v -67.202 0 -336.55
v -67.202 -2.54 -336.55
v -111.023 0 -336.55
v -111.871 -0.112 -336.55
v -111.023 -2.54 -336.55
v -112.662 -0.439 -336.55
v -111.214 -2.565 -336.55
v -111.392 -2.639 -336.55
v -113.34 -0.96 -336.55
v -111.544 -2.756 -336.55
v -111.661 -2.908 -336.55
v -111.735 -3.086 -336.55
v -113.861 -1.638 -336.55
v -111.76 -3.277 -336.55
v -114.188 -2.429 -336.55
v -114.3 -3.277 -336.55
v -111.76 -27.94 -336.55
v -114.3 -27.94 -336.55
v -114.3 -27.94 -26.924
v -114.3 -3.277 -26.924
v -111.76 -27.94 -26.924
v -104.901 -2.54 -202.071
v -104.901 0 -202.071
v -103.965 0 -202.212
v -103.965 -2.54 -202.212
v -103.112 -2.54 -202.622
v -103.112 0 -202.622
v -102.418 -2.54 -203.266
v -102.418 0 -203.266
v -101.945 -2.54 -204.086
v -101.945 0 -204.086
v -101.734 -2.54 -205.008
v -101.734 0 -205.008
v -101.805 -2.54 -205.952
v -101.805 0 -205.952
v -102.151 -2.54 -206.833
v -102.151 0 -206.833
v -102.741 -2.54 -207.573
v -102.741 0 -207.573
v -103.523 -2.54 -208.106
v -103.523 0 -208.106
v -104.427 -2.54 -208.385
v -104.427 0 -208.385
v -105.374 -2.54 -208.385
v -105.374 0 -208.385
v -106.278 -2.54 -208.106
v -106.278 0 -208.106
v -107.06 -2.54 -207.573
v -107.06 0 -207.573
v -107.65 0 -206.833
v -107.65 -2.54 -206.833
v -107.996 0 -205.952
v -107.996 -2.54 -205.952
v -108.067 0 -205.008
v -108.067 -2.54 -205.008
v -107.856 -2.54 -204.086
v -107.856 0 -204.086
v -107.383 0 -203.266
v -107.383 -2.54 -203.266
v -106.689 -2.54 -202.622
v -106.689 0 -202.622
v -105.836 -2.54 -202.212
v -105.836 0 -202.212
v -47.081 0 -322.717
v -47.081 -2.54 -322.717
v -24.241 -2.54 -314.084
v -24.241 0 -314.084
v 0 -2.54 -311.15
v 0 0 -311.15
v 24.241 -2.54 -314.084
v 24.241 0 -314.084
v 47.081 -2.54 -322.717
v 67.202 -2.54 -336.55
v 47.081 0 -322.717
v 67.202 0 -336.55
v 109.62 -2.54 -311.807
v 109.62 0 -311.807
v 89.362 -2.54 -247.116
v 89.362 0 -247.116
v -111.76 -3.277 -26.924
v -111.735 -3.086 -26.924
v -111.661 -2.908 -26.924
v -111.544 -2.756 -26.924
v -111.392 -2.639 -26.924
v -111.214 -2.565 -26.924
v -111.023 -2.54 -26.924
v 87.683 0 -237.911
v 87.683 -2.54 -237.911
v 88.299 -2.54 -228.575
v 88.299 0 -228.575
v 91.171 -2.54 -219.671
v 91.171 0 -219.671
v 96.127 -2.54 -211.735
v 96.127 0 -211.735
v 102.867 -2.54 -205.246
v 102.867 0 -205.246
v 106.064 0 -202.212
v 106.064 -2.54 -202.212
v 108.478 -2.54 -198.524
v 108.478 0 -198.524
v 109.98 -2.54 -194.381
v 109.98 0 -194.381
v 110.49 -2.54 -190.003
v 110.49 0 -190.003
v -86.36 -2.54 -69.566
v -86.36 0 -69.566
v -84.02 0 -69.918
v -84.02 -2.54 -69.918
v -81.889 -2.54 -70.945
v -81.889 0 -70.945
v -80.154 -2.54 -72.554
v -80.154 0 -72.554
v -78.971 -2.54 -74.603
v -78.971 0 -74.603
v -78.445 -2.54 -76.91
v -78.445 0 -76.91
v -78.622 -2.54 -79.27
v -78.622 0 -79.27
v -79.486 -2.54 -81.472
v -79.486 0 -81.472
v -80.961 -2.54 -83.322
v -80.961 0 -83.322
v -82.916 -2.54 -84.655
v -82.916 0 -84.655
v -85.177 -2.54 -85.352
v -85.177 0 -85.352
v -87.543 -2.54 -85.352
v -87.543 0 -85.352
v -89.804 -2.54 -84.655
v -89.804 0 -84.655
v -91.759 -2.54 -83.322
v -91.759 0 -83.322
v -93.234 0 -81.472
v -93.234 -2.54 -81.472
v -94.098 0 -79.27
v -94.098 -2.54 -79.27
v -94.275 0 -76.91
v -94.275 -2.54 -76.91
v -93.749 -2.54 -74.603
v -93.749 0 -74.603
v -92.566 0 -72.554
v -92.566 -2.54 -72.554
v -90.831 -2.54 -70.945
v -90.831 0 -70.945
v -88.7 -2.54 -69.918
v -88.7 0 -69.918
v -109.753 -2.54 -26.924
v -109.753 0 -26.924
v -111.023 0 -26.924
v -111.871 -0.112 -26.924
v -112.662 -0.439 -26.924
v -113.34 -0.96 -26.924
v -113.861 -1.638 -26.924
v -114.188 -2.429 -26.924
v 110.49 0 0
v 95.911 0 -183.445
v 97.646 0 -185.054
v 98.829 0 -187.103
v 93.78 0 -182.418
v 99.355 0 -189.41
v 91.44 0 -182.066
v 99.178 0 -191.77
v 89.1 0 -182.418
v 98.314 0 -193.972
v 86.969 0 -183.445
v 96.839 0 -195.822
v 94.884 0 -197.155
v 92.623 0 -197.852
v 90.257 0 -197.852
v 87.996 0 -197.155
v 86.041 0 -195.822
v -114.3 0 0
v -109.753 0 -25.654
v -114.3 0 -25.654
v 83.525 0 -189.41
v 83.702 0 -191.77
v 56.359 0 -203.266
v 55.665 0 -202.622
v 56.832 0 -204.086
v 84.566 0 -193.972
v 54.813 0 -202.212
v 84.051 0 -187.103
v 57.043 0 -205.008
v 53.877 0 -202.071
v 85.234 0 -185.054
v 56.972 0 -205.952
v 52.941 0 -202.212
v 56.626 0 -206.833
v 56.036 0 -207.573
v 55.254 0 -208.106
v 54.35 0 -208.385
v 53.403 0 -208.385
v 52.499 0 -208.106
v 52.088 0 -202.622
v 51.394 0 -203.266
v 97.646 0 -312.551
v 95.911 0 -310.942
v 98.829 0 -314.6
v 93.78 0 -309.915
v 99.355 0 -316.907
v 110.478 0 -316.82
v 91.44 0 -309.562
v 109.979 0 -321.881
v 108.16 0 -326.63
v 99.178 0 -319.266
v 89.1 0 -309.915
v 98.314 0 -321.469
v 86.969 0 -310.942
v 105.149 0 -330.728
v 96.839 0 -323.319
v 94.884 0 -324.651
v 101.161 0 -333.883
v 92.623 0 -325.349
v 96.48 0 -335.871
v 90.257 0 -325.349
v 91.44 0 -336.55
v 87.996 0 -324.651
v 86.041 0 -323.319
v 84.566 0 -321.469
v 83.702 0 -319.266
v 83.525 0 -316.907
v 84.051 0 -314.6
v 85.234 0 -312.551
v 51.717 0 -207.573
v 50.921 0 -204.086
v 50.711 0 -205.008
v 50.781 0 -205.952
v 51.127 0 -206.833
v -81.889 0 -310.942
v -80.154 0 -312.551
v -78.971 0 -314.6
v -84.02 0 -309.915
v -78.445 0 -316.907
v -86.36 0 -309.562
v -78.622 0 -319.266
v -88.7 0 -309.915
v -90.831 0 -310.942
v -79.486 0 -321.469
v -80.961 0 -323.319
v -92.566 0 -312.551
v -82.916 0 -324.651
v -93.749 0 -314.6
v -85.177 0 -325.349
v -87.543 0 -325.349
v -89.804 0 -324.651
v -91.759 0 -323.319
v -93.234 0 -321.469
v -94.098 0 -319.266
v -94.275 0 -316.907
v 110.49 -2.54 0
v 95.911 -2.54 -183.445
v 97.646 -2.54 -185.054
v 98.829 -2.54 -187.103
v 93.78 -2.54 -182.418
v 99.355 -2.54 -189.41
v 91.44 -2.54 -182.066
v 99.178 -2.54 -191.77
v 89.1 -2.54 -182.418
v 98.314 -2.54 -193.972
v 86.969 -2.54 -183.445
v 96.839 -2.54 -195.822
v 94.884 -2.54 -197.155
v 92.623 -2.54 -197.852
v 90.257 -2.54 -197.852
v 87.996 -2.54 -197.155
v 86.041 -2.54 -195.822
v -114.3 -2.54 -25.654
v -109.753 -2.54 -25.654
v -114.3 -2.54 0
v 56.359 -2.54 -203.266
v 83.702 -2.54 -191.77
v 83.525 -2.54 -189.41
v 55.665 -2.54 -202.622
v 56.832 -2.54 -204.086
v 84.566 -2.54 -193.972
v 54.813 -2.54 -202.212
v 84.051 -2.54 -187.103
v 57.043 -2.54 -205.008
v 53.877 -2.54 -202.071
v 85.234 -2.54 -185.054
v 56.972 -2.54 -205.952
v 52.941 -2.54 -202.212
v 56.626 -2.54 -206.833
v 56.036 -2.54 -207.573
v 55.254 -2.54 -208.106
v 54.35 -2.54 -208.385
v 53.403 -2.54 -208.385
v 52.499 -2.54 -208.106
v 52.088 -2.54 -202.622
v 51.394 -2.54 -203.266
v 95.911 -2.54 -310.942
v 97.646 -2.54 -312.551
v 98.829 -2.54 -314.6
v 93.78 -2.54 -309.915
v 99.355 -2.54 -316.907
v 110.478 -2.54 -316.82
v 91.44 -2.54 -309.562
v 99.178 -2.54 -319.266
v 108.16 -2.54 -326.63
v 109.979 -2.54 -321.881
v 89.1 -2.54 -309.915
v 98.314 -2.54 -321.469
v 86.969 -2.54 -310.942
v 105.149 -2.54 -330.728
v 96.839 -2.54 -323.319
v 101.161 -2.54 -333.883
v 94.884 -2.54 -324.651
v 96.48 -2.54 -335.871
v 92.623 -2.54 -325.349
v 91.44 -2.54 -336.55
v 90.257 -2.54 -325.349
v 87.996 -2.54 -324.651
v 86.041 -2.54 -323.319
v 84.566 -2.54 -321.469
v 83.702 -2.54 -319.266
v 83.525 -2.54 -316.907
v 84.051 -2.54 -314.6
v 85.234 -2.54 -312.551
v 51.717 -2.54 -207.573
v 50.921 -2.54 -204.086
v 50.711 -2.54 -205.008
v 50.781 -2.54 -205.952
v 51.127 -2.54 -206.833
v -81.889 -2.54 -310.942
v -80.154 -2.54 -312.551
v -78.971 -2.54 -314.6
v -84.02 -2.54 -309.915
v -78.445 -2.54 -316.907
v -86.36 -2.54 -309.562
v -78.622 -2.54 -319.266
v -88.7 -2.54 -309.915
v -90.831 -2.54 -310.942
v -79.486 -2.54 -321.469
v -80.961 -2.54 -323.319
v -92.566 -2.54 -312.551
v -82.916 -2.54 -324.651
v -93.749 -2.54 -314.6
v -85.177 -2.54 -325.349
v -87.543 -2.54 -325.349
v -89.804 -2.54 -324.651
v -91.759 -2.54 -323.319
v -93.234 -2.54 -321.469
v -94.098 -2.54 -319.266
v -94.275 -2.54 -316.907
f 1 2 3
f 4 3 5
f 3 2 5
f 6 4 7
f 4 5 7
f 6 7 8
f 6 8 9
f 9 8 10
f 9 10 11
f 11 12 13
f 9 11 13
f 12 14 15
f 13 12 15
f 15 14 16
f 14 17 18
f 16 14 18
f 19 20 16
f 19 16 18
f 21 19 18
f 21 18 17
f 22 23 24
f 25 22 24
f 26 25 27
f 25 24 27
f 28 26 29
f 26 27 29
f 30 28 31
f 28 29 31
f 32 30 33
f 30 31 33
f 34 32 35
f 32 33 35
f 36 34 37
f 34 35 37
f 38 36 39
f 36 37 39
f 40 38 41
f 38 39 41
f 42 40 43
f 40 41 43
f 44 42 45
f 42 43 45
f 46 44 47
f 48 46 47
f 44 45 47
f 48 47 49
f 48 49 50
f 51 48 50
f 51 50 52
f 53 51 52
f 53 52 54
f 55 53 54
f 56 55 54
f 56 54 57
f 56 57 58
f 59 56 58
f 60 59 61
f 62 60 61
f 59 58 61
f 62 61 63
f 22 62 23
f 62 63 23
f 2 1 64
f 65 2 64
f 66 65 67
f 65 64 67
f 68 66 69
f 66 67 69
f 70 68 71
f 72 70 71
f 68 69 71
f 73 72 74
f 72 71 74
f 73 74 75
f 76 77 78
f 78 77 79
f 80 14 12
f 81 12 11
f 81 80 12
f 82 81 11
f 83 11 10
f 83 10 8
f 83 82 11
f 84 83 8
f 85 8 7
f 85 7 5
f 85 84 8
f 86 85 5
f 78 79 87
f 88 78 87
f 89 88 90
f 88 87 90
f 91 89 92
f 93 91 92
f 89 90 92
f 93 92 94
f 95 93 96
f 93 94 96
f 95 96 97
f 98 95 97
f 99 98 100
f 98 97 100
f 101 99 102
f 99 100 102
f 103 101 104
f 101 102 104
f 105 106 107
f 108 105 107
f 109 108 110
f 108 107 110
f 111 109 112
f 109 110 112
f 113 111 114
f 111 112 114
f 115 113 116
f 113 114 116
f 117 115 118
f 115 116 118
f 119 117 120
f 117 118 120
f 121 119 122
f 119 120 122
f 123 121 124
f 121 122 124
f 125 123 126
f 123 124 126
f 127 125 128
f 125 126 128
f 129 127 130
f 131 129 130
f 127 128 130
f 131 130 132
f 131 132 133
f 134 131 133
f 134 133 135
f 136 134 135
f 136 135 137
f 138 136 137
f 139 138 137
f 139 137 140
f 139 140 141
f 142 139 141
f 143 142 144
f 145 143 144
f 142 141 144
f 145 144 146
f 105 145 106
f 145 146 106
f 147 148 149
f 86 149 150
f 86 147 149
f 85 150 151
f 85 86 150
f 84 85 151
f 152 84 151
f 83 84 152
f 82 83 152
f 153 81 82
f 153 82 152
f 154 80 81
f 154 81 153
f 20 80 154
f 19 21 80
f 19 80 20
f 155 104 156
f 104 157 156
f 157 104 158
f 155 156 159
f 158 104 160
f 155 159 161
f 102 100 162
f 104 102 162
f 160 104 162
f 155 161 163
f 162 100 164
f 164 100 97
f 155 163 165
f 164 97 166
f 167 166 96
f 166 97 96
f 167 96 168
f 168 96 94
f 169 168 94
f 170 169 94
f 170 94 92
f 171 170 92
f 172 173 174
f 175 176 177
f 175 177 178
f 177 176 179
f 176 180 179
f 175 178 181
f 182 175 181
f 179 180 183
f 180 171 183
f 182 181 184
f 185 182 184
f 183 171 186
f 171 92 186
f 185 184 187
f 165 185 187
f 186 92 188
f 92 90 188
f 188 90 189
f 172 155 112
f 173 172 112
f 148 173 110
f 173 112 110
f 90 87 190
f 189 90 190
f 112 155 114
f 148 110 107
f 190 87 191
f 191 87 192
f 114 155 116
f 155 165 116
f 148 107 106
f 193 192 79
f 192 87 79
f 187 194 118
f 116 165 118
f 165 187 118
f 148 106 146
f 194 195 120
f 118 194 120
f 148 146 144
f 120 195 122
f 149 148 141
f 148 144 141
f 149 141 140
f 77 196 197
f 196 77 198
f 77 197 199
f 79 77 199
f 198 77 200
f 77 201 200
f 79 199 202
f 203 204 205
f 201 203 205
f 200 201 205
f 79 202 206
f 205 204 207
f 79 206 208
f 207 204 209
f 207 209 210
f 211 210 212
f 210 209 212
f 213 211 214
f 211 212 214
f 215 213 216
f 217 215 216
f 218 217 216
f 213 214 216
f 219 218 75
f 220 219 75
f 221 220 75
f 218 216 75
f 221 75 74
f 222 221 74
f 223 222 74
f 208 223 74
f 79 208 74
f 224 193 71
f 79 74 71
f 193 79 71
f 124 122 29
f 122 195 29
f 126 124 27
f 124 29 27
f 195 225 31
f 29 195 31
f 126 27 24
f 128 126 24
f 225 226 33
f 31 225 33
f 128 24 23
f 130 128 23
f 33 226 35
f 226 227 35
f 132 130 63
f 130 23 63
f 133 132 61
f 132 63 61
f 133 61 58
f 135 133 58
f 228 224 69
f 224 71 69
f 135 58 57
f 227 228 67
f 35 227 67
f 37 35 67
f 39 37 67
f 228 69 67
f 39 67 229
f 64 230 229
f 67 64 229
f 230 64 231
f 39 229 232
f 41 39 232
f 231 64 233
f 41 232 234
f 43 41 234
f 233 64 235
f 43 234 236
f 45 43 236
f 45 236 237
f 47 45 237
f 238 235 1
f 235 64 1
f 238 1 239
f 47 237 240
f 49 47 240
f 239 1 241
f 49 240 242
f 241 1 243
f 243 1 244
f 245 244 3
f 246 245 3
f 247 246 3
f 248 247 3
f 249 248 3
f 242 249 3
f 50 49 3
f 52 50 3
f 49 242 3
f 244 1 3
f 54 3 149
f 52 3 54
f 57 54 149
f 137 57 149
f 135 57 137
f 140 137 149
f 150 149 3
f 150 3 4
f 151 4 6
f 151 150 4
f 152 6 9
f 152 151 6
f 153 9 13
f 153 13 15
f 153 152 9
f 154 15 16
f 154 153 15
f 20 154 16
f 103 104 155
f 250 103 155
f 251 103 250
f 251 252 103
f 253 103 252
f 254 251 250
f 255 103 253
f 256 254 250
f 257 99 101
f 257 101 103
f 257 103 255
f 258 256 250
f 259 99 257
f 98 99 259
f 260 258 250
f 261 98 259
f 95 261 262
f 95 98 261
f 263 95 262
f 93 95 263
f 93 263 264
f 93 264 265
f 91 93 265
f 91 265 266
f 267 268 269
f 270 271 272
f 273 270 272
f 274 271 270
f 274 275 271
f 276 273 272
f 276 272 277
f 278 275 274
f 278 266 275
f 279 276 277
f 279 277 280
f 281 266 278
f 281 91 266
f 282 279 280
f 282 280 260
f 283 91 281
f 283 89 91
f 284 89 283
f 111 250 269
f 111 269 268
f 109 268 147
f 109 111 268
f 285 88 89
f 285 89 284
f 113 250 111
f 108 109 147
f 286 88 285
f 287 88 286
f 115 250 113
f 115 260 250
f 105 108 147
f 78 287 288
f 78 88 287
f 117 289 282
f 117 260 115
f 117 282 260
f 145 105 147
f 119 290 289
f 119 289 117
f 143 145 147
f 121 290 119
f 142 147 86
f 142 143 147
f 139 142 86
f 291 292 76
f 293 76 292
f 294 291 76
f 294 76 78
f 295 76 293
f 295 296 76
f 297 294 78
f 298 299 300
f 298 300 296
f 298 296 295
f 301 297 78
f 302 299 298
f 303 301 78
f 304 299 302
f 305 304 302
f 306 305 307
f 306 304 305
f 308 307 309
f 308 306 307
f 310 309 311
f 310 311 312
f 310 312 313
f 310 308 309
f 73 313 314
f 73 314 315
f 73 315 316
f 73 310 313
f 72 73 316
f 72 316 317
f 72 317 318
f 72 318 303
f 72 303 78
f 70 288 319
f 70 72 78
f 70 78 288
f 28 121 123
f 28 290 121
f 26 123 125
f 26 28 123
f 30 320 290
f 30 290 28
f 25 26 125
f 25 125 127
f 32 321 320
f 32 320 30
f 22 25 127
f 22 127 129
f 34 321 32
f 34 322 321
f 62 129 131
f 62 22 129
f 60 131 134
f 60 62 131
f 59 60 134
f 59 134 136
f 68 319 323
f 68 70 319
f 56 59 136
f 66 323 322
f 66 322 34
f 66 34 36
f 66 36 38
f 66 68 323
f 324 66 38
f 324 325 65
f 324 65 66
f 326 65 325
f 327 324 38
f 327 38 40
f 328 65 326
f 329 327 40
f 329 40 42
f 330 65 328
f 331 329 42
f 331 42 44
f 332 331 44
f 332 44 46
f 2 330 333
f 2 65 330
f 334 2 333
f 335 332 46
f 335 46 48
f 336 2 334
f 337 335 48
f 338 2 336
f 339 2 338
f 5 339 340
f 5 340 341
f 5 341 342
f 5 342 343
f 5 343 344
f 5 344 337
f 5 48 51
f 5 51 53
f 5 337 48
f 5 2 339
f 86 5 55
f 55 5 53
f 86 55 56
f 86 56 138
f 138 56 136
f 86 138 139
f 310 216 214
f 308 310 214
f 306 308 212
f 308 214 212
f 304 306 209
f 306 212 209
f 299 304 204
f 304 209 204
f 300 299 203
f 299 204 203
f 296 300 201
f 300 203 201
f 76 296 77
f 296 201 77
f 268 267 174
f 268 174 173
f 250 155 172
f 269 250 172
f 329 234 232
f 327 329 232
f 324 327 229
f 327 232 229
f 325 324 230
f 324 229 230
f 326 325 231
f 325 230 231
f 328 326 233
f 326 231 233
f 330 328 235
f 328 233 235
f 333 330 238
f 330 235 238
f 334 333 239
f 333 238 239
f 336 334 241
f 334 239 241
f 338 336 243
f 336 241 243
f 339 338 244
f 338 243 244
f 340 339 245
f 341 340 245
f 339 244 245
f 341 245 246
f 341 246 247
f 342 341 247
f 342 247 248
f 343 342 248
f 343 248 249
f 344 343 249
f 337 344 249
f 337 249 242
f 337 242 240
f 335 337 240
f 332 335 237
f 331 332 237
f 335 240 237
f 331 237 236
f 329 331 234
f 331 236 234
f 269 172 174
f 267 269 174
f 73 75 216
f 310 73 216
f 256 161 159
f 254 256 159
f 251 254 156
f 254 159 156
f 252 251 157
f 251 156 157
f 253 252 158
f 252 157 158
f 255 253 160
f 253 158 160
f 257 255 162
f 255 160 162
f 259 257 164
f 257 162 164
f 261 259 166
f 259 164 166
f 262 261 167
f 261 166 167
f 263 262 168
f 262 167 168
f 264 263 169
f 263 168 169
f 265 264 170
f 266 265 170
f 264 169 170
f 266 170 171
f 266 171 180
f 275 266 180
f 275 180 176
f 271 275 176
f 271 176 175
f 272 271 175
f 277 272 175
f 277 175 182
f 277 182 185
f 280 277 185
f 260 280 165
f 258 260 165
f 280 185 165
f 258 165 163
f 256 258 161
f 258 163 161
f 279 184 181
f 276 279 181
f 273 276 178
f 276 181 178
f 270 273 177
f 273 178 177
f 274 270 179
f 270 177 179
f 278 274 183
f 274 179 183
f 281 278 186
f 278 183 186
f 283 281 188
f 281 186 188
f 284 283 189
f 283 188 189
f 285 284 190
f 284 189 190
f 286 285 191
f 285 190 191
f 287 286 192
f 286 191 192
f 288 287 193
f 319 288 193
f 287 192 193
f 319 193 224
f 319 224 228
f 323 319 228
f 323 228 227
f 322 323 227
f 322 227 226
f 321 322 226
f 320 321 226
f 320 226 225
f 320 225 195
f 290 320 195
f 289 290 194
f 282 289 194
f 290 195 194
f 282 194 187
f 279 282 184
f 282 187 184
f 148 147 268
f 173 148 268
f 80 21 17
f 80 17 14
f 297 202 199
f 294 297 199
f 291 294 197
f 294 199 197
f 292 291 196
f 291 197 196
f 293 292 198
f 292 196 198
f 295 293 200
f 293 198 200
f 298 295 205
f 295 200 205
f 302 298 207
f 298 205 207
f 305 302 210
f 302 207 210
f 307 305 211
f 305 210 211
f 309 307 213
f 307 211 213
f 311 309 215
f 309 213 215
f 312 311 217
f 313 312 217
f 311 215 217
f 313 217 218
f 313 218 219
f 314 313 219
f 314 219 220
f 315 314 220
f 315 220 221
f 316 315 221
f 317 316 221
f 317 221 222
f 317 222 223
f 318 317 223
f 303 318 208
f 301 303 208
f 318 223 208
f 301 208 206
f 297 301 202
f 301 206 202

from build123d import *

# Parameters (mm, degrees)
SKETCH1_R                     = 7.9375
SKETCH1_R_2                   = 3.175
BASE_FLANGE1_DEPTH            = 2.54
EDGE_FLANGE2_STRIP_W          = 11.6332
EDGE_FLANGE2_STRIP_H          = 2.54
EDGE_FLANGE2_STRIP_CUT_DEPTH  = 309.626
EDGE_FLANGE2_RELIEF_W         = 12.9032
EDGE_FLANGE2_RELIEF_H         = 1.27
EDGE_FLANGE2_RELIEF_CUT_DEPTH = 2.54
EDGE_FLANGE2_DEPTH            = 309.626


# Sheet-metal steps are written as plain solids
with BuildPart() as part:
    # Sketch1 → Base-Flange1 (new body)
    with BuildSketch(Plane(origin=(0, 0, 0), x_dir=(1, 0, 0), z_dir=(0, 1, 0))):
        with BuildLine():
            Line((109.619528436, 311.807263764), (89.361961148, 247.115522342))
            ThreePointArc((89.361961148, 247.115522342), (89.460566801, 224.034337943), (102.867006006, 205.245559798))
            ThreePointArc((102.867006006, 205.245559798), (108.478001121, 198.524407286), (110.49, 190.003314763))
            Line((110.49, 190.003314763), (110.49, 0))
            Line((110.49, 0), (-114.3, 0))
            Line((-114.3, 0), (-114.3, 336.55))
            Line((-114.3, 336.55), (-67.202083301, 336.55))
            ThreePointArc((-67.202083301, 336.55), (0, 311.15), (67.202083301, 336.55))
            Line((67.202083301, 336.55), (91.44, 336.55))
            ThreePointArc((91.44, 336.55), (106.791695758, 328.779536221), (109.619528436, 311.807263764))
        make_face()
        with Locations(Location((-86.36, 317.5, 0), (0, 0, 270))):
            Circle(SKETCH1_R, mode=Mode.SUBTRACT)
        with Locations(Location((91.44, 317.5, 0), (0, 0, 270))):
            Circle(SKETCH1_R, mode=Mode.SUBTRACT)
        with Locations(Location((91.44, 190.003314763, 0), (0, 0, 270))):
            Circle(SKETCH1_R, mode=Mode.SUBTRACT)
        with Locations(Location((-86.36, 77.503314763, 0), (0, 0, 270))):
            Circle(SKETCH1_R, mode=Mode.SUBTRACT)
        with Locations(Location((-104.900544931, 205.245559798, 0), (0, 0, 270))):
            Circle(SKETCH1_R_2, mode=Mode.SUBTRACT)
        with Locations(Location((53.876660191, 205.245559798, 0), (0, 0, 270))):
            Circle(SKETCH1_R_2, mode=Mode.SUBTRACT)
    extrude(amount=-BASE_FLANGE1_DEPTH)

    # Edge-Flange2 strip (across the edge) → Edge-Flange2 strip cut (cut)
    with BuildSketch(Plane(origin=(-114.3, -2.54, -26.924), x_dir=(1, 0, 0), z_dir=(0, 0, -1))):
        with Locations((-2.54, -1.27)):
            Rectangle(EDGE_FLANGE2_STRIP_W, EDGE_FLANGE2_STRIP_H)
    extrude(amount=EDGE_FLANGE2_STRIP_CUT_DEPTH, mode=Mode.SUBTRACT)

    # Edge-Flange2 relief (on the sheet) → Edge-Flange2 relief cut (cut)
    with BuildSketch(Plane(origin=(-111.0234, -2.54, -26.924), x_dir=(1, 0, 0), z_dir=(0, -1, 0))):
        with Locations((-5.1816, 0.635)):
            Rectangle(EDGE_FLANGE2_RELIEF_W, EDGE_FLANGE2_RELIEF_H)
    extrude(amount=-EDGE_FLANGE2_RELIEF_CUT_DEPTH, mode=Mode.SUBTRACT)

    # Edge-Flange2 section (across the edge) → Edge-Flange2 (add)
    with BuildSketch(Plane(origin=(-114.3, -2.54, -26.924), x_dir=(1, 0, 0), z_dir=(0, 0, -1))):
        with BuildLine():
            Line((0, 0.7366), (0, 25.4))
            Line((0, 25.4), (2.54, 25.4))
            Line((2.54, 25.4), (2.54, 0.7366))
            ThreePointArc((2.54, 0.7366), (2.755745145, 0.215745145), (3.2766, 0))
            Line((3.2766, 0), (3.2766, -2.54))
            ThreePointArc((3.2766, -2.54), (0.959693921, -1.580306079), (0, 0.7366))
        make_face()
    extrude(amount=EDGE_FLANGE2_DEPTH)


solid = part.part
